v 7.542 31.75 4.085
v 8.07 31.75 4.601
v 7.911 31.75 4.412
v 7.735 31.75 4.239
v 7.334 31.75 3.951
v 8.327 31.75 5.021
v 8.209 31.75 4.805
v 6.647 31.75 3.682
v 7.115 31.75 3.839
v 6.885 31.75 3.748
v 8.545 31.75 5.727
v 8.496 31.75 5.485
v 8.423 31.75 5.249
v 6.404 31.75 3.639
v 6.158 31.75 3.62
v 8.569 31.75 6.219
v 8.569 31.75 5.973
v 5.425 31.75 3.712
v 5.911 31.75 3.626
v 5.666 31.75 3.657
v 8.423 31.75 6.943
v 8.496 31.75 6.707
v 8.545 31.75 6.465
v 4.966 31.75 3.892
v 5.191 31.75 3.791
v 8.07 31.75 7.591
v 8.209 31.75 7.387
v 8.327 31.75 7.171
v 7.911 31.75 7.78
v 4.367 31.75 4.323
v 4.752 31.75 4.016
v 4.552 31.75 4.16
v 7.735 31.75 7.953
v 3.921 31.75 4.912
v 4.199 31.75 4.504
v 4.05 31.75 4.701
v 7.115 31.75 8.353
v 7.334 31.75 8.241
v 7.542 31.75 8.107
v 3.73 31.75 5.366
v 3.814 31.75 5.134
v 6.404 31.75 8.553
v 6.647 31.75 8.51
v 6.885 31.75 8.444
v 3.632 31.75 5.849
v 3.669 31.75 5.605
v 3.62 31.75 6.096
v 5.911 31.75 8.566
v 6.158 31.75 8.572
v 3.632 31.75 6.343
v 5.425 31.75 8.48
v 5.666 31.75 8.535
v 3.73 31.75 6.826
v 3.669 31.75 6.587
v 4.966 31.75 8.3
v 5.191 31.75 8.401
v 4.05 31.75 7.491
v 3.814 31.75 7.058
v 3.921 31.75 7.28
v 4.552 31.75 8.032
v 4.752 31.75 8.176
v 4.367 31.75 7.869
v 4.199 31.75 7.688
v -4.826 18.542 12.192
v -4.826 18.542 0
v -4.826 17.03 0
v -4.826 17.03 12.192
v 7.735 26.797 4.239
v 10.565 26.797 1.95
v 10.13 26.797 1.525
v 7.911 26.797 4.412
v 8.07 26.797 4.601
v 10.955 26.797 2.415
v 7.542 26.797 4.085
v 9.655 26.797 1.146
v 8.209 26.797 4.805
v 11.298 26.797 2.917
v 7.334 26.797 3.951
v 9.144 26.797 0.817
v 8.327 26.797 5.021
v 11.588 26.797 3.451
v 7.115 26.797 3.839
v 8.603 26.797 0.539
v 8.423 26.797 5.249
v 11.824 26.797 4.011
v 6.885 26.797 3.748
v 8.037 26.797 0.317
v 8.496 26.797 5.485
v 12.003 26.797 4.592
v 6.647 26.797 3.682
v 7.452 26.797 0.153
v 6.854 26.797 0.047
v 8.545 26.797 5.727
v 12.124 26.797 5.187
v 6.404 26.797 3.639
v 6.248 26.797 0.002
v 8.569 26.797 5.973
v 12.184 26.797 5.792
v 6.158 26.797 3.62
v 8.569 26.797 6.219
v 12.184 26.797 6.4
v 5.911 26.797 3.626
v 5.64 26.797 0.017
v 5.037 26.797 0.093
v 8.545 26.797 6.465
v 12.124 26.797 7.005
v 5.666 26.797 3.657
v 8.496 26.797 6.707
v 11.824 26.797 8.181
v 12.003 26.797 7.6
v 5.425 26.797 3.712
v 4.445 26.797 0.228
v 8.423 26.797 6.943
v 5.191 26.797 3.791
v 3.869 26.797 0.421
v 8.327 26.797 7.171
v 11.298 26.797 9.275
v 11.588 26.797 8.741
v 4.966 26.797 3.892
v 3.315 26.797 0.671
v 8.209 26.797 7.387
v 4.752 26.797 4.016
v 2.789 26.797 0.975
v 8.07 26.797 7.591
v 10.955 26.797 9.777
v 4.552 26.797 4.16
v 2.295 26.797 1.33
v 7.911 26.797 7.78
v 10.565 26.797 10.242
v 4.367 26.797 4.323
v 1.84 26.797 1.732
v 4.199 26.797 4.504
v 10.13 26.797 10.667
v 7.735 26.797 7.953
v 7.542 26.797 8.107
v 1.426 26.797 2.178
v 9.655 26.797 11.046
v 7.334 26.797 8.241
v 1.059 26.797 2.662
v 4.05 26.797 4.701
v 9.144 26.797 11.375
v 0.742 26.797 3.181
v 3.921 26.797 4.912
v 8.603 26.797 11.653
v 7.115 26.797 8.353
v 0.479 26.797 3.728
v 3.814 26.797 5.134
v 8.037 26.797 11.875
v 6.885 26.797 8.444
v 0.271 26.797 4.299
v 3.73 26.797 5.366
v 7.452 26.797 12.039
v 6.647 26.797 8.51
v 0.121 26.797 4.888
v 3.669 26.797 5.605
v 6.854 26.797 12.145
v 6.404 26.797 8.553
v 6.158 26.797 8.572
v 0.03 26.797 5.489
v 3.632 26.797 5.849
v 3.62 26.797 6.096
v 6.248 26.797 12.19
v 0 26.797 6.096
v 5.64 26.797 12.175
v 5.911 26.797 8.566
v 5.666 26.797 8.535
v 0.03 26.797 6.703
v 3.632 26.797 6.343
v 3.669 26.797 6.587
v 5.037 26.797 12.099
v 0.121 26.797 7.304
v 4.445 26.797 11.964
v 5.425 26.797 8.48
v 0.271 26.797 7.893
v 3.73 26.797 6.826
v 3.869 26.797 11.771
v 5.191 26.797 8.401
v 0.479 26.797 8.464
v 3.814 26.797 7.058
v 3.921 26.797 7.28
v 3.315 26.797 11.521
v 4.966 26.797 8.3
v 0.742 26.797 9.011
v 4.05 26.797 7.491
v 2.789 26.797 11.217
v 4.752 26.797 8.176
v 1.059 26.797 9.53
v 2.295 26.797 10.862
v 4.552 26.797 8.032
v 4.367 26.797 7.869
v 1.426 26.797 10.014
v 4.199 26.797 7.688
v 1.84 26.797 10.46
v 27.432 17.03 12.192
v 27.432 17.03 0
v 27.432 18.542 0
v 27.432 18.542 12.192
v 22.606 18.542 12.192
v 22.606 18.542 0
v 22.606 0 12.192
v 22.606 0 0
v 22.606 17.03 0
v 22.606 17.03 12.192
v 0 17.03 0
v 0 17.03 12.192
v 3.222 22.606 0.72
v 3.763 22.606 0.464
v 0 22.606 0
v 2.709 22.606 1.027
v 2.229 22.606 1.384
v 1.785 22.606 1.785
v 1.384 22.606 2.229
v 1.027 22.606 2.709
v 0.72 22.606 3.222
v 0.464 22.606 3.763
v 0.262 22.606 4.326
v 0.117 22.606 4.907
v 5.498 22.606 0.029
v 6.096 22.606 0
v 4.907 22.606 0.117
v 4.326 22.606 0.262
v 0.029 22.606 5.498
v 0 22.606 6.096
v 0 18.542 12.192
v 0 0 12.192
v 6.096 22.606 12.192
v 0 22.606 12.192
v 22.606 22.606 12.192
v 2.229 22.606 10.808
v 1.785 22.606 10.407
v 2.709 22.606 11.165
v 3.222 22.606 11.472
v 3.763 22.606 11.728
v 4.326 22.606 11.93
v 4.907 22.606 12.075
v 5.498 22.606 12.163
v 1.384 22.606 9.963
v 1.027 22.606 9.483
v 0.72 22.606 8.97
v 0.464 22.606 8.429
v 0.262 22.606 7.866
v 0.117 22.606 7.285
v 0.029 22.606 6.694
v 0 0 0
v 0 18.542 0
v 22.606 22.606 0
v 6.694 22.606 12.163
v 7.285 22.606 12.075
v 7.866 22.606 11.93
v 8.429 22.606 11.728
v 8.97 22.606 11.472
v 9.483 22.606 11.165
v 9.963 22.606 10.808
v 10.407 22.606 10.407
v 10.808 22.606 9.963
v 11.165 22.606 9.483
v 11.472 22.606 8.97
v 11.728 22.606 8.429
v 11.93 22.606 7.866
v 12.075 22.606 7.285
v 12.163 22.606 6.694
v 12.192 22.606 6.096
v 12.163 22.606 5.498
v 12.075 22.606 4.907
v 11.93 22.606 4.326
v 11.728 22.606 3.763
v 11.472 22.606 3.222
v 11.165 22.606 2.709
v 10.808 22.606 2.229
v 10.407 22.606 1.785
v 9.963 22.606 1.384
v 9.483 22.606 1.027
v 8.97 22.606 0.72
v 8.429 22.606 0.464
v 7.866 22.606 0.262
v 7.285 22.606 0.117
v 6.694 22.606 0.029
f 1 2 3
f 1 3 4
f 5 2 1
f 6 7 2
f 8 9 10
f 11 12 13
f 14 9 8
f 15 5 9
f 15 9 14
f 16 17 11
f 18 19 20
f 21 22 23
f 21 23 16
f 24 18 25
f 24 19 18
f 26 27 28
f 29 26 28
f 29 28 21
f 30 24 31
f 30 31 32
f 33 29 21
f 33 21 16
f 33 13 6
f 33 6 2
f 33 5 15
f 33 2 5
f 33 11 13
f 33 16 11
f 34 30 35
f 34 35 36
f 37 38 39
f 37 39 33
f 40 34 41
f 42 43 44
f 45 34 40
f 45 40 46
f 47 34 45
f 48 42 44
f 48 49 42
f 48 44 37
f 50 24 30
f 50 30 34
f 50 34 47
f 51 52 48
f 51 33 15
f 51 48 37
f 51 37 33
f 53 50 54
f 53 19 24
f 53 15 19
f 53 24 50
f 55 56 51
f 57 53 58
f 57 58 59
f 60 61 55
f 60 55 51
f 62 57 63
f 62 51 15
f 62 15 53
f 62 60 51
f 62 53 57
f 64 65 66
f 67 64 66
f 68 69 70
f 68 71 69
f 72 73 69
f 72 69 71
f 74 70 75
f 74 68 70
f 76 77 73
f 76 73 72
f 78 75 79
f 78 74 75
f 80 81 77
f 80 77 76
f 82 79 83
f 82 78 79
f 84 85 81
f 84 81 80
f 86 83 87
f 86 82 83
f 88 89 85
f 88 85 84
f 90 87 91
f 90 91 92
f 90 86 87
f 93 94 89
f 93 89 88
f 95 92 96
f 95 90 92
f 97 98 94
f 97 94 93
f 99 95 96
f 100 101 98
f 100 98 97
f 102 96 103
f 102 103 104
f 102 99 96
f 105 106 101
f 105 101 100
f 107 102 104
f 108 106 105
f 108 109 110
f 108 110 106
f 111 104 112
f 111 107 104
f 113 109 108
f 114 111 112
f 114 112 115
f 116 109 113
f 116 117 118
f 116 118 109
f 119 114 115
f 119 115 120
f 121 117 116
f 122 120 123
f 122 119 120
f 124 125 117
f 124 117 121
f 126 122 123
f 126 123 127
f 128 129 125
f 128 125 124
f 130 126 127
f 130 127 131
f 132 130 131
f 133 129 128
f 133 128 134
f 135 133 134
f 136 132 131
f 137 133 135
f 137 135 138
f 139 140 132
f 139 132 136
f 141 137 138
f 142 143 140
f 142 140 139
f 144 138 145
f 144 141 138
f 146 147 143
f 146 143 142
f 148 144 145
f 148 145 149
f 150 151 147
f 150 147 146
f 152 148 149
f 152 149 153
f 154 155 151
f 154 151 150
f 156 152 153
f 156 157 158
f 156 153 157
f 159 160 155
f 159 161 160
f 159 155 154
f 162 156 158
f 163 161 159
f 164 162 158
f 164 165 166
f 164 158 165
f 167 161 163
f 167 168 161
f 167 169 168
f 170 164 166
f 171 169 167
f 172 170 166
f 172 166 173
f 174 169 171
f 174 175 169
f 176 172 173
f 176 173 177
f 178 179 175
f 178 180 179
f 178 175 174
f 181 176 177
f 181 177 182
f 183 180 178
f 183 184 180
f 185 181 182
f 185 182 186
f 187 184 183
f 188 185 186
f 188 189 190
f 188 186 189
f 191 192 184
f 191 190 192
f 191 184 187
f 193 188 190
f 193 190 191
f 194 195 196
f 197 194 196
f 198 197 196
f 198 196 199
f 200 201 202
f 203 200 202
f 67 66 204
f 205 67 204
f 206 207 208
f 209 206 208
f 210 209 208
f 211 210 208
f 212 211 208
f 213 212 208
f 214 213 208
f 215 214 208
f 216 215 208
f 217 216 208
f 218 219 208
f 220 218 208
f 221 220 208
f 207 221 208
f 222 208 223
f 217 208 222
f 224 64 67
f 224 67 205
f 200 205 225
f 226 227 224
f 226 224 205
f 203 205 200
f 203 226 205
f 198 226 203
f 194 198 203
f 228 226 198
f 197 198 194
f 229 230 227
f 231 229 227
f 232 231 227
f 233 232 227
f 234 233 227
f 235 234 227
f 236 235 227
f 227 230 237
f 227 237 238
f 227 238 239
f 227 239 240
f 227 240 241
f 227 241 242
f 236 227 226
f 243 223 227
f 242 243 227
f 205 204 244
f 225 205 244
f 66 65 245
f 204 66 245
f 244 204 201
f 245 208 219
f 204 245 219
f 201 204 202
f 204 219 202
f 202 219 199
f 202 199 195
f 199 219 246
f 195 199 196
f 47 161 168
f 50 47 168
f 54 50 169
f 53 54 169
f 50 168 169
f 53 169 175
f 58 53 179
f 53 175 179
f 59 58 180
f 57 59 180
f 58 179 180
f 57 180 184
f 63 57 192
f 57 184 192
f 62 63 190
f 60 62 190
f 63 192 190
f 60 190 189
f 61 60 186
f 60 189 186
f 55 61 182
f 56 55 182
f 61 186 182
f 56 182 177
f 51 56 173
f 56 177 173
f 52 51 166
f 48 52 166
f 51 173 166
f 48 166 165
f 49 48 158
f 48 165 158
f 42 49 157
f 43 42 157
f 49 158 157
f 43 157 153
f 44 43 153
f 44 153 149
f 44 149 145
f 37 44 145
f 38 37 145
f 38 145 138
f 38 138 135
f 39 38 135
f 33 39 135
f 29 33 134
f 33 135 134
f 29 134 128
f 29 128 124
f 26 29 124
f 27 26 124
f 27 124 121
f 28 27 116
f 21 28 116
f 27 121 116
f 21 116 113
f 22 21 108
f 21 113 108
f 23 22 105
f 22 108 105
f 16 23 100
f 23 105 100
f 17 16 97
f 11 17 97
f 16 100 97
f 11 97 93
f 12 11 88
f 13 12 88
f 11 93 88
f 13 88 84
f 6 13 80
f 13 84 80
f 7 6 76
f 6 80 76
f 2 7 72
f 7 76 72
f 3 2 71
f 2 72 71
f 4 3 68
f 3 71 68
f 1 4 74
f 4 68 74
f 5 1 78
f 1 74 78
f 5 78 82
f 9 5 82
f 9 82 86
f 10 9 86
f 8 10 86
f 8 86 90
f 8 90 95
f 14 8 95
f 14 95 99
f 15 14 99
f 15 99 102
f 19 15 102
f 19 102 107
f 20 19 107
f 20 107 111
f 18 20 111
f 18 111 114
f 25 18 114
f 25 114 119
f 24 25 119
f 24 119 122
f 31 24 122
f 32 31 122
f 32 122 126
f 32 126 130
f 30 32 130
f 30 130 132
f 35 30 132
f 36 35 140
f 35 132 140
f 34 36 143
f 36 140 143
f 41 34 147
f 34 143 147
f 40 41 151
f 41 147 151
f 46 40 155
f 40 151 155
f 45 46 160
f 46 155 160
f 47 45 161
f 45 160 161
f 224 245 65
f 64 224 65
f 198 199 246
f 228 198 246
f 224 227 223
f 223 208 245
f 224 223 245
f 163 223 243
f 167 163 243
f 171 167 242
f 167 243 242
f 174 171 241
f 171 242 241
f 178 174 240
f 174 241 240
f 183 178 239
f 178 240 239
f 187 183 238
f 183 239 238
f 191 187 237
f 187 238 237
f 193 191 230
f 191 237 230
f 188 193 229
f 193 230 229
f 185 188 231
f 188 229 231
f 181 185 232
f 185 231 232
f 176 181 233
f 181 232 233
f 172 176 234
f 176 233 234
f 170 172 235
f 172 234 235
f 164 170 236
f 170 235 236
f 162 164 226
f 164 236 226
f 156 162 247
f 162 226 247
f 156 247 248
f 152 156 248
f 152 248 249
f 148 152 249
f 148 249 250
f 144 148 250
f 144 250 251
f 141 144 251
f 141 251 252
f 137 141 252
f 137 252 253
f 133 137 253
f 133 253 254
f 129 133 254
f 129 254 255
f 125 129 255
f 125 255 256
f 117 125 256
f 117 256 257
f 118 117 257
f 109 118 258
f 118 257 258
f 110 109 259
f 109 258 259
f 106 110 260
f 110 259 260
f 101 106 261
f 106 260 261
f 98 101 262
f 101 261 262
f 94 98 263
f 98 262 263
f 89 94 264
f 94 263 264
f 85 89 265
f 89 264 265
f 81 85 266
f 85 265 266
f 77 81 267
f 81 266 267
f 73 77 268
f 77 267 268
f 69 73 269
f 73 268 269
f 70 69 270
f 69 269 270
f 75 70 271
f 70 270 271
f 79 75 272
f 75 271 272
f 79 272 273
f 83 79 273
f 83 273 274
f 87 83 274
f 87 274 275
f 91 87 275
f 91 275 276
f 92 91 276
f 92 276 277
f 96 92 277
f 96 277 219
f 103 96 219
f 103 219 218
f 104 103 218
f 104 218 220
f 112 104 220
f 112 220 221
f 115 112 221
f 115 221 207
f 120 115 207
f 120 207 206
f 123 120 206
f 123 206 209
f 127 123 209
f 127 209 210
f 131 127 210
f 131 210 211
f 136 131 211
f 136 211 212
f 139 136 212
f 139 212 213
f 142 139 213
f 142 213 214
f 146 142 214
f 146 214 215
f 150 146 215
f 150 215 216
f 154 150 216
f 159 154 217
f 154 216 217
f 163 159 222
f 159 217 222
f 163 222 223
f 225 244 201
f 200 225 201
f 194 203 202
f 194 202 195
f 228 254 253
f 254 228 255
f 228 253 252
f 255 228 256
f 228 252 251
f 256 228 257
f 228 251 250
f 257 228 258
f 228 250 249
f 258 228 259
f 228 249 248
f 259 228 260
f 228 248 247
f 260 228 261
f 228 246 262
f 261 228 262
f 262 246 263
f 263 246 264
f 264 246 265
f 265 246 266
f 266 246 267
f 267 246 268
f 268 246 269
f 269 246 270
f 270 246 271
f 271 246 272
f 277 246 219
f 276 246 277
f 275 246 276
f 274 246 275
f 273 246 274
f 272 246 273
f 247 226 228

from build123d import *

# Parameters (mm, degrees)
F1_DEPTH = 12.192
F2_R     = 6.096
F3_DEPTH = 4.191
F4_R     = 2.4765
F5_DEPTH = 4.953


with BuildPart() as f1:
    # F0 (on Top) → F1 (new body)
    with BuildSketch(Plane.XY):
        Polygon((0, 17.030123), (0, 0), (22.606, 0), (22.606, 17.030123), (27.432, 17.030123), (27.432, 18.542), (22.606, 18.542), (22.606, 22.606), (0, 22.606), (0, 18.542), (-4.826, 18.542), (-4.826, 17.030123), align=None)
    extrude(amount=F1_DEPTH)

    # F2 (on face) → F3 (join)
    with BuildSketch(Plane(origin=(0, 22.606, 0), x_dir=(-1, 0, 0), z_dir=(0, 1, 0))):
        with Locations((-6.096, 6.096)):
            Circle(F2_R)
    extrude(amount=F3_DEPTH)

    # F4 (on face) → F5 (join)
    with BuildSketch(Plane(origin=(0, 26.797, 0), x_dir=(-1, 0, 0), z_dir=(0, 1, 0))):
        with Locations((-6.096, 6.096)):
            Circle(F4_R)
    extrude(amount=F5_DEPTH)


solid = f1.part
